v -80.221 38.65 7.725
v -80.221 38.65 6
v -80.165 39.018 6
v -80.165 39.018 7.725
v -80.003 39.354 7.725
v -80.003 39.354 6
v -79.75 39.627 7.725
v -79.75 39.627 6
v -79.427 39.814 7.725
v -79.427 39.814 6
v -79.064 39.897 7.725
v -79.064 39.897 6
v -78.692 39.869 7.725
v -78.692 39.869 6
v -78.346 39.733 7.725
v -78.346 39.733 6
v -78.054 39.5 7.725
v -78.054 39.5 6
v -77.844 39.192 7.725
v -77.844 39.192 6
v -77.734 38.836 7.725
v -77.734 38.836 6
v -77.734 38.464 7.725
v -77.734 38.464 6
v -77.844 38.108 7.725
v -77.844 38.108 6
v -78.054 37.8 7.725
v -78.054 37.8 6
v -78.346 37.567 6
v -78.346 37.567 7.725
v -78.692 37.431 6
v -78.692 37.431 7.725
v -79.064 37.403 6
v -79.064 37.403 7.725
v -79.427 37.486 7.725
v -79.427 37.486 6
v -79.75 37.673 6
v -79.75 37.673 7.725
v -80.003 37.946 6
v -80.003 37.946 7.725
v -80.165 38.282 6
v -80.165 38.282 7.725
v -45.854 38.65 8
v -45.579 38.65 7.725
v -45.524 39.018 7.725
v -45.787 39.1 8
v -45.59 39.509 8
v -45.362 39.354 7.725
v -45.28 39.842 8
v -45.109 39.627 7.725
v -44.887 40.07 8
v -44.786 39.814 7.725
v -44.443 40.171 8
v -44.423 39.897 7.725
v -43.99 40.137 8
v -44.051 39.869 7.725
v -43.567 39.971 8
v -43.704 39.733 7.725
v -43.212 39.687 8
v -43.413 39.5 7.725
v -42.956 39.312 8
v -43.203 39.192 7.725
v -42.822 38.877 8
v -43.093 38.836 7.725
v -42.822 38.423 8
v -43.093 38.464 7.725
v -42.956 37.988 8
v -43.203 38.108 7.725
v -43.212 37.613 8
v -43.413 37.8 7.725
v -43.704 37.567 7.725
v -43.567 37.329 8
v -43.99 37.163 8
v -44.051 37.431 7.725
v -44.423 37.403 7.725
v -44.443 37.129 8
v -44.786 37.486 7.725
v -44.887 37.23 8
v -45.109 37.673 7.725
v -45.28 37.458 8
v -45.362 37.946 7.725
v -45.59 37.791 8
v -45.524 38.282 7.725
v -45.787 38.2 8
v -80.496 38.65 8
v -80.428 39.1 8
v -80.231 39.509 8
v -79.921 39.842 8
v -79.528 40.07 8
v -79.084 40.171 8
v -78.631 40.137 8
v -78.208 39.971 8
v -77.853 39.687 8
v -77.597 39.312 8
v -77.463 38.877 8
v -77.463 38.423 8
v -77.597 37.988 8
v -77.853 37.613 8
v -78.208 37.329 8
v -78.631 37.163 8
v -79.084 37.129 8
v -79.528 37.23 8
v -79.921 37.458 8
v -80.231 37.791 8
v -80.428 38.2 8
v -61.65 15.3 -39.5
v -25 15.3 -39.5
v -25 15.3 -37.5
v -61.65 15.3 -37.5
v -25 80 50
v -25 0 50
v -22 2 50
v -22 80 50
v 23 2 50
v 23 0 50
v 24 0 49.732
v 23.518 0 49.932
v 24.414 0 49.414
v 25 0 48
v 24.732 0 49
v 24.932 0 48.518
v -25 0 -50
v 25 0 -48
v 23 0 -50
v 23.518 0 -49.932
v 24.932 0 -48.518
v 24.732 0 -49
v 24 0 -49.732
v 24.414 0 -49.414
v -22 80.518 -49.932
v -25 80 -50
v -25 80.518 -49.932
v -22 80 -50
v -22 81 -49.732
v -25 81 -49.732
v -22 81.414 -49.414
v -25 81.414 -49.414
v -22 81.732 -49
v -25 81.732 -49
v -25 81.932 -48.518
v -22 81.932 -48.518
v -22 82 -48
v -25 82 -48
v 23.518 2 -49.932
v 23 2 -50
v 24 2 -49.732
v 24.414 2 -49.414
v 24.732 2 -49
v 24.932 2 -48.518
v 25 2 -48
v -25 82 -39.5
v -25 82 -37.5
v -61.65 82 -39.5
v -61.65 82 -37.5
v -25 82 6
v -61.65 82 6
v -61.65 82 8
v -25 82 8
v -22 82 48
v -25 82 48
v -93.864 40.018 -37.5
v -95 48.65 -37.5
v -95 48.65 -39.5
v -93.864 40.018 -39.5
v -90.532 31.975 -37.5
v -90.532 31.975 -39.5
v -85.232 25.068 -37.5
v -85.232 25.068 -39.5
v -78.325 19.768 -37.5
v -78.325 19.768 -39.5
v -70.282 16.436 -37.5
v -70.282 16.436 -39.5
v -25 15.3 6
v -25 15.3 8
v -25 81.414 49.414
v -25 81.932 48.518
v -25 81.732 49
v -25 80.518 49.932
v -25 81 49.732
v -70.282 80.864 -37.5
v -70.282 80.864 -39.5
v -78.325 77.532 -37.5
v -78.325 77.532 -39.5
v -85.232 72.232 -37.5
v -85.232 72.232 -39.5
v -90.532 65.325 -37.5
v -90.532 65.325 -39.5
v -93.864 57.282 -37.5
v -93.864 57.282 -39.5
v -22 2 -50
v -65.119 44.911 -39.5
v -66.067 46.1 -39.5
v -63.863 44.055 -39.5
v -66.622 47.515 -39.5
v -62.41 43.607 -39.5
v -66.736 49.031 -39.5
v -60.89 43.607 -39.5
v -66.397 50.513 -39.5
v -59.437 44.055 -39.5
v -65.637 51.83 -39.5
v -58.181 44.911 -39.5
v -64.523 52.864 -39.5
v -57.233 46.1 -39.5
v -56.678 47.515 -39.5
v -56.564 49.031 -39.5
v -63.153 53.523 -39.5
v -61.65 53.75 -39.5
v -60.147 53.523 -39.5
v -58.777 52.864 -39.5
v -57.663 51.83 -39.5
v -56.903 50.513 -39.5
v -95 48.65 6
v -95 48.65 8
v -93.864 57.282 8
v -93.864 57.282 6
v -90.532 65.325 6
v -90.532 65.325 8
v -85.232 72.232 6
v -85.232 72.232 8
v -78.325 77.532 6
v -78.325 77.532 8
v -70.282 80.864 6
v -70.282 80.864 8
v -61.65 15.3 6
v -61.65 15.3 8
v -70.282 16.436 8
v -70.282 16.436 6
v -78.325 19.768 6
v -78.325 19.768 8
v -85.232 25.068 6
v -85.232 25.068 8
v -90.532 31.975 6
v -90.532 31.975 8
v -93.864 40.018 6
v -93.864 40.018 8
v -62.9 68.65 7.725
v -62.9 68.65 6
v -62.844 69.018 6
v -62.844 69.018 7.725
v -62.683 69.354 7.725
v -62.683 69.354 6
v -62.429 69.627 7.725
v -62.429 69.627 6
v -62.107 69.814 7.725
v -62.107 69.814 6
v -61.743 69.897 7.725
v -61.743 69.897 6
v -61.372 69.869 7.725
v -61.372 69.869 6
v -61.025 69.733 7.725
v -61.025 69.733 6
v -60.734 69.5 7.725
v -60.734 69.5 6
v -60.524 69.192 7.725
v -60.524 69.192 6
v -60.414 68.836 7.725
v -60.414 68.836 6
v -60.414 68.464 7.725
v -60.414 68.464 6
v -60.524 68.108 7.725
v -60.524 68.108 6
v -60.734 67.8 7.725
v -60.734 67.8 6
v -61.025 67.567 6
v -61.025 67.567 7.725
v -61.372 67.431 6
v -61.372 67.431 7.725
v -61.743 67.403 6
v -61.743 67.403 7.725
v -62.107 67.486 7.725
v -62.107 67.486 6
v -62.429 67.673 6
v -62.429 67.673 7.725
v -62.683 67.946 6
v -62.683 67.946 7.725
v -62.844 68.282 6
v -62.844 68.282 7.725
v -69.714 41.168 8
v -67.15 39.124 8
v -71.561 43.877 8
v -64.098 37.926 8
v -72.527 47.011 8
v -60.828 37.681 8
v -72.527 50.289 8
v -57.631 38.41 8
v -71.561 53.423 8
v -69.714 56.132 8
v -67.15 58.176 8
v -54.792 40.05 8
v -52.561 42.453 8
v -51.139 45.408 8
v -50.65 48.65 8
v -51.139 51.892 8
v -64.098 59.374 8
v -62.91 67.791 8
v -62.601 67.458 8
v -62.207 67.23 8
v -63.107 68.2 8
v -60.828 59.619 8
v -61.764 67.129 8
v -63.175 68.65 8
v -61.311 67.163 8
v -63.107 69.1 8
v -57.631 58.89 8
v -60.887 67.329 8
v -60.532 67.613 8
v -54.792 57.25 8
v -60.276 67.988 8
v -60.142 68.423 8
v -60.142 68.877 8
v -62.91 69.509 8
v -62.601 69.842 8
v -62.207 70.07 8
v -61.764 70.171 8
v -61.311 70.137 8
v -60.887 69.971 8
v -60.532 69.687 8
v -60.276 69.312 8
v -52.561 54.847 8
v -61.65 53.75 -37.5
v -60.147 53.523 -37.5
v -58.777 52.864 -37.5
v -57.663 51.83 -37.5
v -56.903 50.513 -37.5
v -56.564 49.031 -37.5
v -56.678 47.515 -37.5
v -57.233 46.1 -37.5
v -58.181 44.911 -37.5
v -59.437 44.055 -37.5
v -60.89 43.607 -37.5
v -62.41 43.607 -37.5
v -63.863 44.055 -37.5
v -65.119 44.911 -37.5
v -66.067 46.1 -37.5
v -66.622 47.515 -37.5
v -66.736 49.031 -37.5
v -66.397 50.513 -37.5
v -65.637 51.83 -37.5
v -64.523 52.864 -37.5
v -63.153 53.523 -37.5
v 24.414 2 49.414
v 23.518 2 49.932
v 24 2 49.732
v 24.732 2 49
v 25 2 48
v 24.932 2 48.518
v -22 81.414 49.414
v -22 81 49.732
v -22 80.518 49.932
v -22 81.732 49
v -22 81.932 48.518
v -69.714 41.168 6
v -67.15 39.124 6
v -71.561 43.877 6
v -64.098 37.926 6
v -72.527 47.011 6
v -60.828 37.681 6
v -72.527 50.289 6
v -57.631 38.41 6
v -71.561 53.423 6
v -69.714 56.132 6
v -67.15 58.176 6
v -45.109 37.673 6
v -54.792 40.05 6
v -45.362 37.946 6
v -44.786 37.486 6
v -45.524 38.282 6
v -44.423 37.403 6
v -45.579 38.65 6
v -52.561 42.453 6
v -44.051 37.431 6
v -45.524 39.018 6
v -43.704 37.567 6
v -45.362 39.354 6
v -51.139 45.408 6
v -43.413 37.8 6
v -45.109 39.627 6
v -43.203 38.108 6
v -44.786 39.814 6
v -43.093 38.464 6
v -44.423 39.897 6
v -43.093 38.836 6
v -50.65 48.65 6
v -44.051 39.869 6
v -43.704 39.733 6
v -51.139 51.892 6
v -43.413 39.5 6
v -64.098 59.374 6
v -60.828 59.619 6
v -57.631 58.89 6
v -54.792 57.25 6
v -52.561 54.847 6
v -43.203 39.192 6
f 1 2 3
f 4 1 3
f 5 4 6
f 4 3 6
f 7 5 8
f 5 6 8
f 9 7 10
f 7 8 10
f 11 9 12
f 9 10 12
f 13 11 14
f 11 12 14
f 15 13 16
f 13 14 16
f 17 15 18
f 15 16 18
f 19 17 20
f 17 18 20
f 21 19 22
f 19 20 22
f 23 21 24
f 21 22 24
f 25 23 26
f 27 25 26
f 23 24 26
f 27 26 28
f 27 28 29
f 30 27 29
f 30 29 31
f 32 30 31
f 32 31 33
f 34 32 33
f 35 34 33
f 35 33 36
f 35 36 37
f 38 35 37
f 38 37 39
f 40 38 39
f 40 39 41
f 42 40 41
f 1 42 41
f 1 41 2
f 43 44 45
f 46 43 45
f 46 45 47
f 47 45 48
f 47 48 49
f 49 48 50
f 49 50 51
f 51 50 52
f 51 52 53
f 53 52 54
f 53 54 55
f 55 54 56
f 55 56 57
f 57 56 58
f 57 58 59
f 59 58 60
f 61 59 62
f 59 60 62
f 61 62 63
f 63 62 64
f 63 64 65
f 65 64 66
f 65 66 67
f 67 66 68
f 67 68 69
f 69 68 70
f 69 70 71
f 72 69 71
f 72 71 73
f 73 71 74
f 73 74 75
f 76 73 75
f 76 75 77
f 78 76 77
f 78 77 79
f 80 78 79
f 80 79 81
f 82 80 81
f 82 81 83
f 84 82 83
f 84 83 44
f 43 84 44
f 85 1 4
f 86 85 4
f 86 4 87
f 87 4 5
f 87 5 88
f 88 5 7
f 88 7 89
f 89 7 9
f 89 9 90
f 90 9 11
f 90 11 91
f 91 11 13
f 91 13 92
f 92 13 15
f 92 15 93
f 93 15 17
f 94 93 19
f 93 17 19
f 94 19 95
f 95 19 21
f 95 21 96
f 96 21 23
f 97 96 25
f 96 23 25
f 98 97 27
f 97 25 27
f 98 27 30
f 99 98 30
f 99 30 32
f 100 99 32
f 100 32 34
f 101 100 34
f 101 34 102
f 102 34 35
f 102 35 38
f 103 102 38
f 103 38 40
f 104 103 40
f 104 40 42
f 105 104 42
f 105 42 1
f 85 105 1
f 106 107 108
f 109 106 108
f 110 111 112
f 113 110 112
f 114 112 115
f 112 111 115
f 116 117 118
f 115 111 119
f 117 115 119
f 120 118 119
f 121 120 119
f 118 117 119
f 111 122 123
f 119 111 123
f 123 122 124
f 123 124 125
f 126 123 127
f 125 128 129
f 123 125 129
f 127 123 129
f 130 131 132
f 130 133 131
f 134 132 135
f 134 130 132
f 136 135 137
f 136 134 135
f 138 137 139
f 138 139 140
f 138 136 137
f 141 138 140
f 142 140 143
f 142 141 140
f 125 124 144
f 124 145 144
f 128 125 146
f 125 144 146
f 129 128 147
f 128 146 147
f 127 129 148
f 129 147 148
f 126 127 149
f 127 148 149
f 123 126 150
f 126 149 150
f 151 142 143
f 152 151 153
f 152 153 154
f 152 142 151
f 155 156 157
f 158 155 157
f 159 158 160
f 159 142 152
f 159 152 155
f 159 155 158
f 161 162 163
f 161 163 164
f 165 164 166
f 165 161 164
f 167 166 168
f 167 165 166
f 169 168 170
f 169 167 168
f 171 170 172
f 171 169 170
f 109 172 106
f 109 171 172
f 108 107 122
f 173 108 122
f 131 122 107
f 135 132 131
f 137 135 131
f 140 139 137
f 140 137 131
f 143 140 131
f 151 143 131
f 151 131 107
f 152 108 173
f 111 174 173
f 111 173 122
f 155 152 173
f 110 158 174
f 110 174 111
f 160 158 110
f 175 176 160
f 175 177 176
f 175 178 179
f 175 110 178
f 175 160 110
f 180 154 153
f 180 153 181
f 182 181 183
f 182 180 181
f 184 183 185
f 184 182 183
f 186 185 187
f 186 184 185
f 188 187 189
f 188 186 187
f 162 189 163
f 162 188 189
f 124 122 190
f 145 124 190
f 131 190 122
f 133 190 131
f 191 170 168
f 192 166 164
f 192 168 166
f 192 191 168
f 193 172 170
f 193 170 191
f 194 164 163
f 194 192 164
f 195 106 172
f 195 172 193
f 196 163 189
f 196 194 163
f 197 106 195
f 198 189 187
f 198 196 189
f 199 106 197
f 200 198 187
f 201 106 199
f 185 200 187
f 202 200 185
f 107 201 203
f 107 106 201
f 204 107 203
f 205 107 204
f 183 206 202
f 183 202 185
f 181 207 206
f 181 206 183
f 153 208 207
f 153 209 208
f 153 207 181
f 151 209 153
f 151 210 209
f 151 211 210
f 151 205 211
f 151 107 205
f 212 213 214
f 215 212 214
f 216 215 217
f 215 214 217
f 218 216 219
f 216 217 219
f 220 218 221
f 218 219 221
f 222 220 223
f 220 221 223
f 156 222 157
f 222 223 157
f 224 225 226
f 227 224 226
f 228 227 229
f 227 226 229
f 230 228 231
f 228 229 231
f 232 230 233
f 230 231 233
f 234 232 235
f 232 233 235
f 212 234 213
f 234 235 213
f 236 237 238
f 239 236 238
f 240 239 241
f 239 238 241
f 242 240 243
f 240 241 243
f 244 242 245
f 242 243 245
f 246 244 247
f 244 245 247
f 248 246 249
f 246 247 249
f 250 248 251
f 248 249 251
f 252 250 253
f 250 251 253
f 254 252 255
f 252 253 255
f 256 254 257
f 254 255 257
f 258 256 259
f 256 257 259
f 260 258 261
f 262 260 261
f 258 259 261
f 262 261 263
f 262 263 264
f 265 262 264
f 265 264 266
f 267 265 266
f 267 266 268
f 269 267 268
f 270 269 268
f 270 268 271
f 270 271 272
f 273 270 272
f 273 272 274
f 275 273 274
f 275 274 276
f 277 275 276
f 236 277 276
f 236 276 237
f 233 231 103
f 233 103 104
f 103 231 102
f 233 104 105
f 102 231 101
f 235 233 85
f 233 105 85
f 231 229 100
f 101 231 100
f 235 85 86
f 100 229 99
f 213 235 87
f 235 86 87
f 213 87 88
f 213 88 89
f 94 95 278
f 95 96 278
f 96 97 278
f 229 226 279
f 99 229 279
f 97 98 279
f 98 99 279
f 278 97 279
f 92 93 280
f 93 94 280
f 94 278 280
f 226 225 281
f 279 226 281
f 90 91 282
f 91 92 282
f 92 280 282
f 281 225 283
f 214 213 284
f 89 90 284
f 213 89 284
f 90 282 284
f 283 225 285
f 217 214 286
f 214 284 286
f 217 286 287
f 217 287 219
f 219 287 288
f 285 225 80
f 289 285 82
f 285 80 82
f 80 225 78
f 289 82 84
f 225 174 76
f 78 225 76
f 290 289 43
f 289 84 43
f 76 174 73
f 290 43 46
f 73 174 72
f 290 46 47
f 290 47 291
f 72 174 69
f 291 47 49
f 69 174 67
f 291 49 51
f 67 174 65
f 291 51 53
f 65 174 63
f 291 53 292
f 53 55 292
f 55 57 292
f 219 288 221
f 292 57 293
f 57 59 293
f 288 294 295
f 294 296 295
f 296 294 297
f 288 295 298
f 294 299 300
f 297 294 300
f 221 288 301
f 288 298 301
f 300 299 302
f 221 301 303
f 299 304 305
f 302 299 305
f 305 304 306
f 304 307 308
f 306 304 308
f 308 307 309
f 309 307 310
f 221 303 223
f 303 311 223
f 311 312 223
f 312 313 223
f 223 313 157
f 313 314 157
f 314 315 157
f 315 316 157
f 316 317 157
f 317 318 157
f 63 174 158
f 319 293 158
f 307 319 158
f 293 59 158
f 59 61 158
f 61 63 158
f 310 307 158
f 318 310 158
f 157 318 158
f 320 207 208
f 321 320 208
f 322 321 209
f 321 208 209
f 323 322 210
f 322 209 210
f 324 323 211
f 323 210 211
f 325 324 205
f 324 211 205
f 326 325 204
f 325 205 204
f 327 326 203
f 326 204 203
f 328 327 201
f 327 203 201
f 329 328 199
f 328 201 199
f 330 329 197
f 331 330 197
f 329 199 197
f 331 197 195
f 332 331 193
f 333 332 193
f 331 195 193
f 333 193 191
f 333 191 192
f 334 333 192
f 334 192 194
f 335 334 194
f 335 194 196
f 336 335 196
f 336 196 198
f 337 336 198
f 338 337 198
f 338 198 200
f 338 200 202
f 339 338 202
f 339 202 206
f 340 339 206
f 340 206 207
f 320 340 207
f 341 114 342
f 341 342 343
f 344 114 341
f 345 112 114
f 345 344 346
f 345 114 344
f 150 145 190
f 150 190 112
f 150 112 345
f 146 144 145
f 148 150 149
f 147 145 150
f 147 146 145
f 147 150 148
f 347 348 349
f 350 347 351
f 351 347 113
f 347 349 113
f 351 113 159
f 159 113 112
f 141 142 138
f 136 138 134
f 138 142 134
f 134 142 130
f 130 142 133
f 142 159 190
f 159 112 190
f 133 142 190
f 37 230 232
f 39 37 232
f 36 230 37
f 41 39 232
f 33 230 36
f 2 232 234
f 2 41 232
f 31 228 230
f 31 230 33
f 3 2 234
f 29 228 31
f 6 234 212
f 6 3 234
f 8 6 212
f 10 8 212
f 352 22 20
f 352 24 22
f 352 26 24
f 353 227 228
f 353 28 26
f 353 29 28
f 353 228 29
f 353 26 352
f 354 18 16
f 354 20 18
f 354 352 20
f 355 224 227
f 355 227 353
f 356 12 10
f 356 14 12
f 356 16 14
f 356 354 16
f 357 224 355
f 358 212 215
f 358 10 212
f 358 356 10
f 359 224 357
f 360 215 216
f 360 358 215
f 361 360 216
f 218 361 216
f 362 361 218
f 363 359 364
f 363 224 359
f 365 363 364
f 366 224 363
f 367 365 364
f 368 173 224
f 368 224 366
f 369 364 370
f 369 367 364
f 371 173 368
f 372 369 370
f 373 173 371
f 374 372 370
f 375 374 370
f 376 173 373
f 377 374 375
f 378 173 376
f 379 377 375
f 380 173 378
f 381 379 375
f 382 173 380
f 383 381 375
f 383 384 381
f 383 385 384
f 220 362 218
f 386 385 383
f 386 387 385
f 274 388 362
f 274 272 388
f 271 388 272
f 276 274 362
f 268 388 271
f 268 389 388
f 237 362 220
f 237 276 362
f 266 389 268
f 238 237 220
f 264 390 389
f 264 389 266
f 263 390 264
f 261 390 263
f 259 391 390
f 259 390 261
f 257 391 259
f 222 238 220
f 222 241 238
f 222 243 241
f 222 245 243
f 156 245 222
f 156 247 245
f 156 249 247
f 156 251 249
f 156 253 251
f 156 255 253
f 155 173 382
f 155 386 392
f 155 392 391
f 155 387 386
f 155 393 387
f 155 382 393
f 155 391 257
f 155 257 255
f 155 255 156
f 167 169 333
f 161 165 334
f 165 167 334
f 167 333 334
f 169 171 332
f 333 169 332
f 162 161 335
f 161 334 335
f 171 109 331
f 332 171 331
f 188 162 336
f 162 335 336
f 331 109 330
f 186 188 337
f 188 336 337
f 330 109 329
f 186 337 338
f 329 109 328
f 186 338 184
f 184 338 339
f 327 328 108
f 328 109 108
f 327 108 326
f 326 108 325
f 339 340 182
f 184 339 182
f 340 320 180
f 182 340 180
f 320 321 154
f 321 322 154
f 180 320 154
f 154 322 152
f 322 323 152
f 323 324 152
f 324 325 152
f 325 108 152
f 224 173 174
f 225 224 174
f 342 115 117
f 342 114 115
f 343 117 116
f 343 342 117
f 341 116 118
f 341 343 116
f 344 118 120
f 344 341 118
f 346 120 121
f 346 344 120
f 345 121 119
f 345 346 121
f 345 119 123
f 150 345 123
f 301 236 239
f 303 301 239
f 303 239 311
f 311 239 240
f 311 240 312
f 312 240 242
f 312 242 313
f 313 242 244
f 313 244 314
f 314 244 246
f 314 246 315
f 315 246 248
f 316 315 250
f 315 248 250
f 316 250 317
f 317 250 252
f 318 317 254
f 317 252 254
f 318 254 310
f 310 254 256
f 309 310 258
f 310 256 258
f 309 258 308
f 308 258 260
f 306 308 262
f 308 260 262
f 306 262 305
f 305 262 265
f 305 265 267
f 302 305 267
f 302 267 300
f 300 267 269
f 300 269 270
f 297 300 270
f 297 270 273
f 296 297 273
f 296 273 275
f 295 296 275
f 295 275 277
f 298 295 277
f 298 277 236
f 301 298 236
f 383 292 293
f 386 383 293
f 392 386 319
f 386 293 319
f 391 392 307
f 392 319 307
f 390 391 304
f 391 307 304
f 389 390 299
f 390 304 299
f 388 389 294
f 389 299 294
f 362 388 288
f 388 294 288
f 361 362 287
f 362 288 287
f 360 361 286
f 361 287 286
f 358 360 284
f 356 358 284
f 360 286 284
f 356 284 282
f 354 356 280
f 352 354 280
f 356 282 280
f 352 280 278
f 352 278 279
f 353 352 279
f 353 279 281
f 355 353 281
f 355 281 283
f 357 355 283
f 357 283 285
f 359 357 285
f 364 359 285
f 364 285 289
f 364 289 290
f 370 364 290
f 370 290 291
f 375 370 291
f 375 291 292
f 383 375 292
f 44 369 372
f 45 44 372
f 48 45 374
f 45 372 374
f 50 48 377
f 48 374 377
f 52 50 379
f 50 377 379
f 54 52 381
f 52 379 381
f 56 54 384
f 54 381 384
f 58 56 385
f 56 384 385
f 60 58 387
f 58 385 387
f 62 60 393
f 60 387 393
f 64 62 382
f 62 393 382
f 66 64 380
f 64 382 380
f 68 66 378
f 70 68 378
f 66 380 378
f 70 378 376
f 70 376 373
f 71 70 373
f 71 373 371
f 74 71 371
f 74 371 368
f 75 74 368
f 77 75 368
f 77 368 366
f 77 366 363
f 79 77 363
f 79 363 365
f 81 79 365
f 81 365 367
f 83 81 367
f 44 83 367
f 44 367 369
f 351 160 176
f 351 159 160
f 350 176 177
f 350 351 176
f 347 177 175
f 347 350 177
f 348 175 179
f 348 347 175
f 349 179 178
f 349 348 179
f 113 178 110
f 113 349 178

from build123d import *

# Parameters (mm, degrees)
SKETCH_1_W                   = 50
SKETCH_1_H                   = 100
EXTRUDE_1_DEPTH              = 2
SKETCH_2_W                   = 3
SKETCH_2_H                   = 100
EXTRUDE_2_DEPTH              = 80
SKETCH_3_W                   = 2
SKETCH_3_H                   = 66.7
EXTRUDE_3_DEPTH              = 70
CUT_EXTRUDE_4_REACH          = 162.465
SKETCH_8_W                   = 2
SKETCH_8_H                   = 66.7
EXTRUDE_4_DEPTH              = 70
CUT_EXTRUDE_5_REACH          = 140.25
HOLE_WIZARD_M3_1_D           = 2.5
HOLE_WIZARD_M3_1_DEPTH       = 2
HOLE_WIZARD_M3_1_CSINK_D     = 3.05
HOLE_WIZARD_M3_1_CSINK_ANGLE = 90
FILLET_1_R                   = 2
CUT_EXTRUDE_6_REACH          = 140.25
SKETCH_12_R                  = 11
CUT_EXTRUDE_7_REACH          = 162.465
SKETCH_13_R                  = 14.5
SKETCH_14_W                  = 2
SKETCH_14_H                  = 66.7
EXTRUDE_5_DEPTH              = 70
CUT_EXTRUDE_8_REACH          = 156.14
SKETCH_15_R                  = 5.1
CUT_EXTRUDE_9_DEPTH          = 155.140358116
CUT_EXTRUDE_9_DEPTH_BACK     = 155.140358116
SKETCH_19_W                  = 2
SKETCH_19_H                  = 66.7
CUT_EXTRUDE_10_DEPTH         = 119.844436134
FILLET_2_R                   = 2


with BuildPart() as part:
    # 草图1 → 凸台-拉伸1 (new body)
    with BuildSketch(Plane(origin=(0, 0, 0), x_dir=(1, 0, 0), z_dir=(0, 1, 0))):
        Rectangle(SKETCH_1_W, SKETCH_1_H)
    extrude(amount=EXTRUDE_1_DEPTH)

    # 草图2 → 凸台-拉伸2 (add)
    with BuildSketch(Plane(origin=(0, 2, 0), x_dir=(1, 0, 0), z_dir=(0, 1, 0))):
        with Locations((-23.5, 0)):
            Rectangle(SKETCH_2_W, SKETCH_2_H)
    extrude(amount=EXTRUDE_2_DEPTH)

    # 草图3 → 凸台-拉伸3 (add)
    with BuildSketch(Plane.ZY.offset(25)):
        with Locations((-49, 48.65)):
            Rectangle(SKETCH_3_W, SKETCH_3_H)
    extrude(amount=EXTRUDE_3_DEPTH)

    # 草图4 → 切除-拉伸4 (cut, up to next)
    with BuildSketch(Plane(origin=(0, 0, -50), x_dir=(-1, 0, 0), z_dir=(0, 0, -1)), mode=Mode.PRIVATE) as cut_extrude_4_sk1:
        with BuildLine():
            Line((95, 82), (61.65, 82))
            ThreePointArc((61.65, 82), (85.232011153, 72.232011153), (95, 48.65))
            Line((95, 48.65), (95, 82))
        make_face()
    cut_extrude_4_tool1 = extrude(cut_extrude_4_sk1.sketch, amount=-CUT_EXTRUDE_4_REACH, mode=Mode.PRIVATE) & part.part
    # 草图4 → 切除-拉伸4 (cut, up to next)
    with BuildSketch(Plane(origin=(0, 0, -50), x_dir=(-1, 0, 0), z_dir=(0, 0, -1)), mode=Mode.PRIVATE) as cut_extrude_4_sk2:
        with BuildLine():
            ThreePointArc((95, 48.65), (85.232011153, 25.067988847), (61.65, 15.3))
            Line((61.65, 15.3), (95, 15.3))
            Line((95, 15.3), (95, 48.65))
        make_face()
    cut_extrude_4_tool2 = extrude(cut_extrude_4_sk2.sketch, amount=-CUT_EXTRUDE_4_REACH, mode=Mode.PRIVATE) & part.part
    add(cut_extrude_4_tool1.solids().sort_by_distance((-87.550679, 74.550679, -50))[0], mode=Mode.SUBTRACT)
    add(cut_extrude_4_tool2.solids().sort_by_distance((-87.550679, 22.749321, -50))[0], mode=Mode.SUBTRACT)

    # 草图8 → 凸台-拉伸4 (add)
    with BuildSketch(Plane.ZY.offset(25)):
        with Locations((7, 48.65)):
            Rectangle(SKETCH_8_W, SKETCH_8_H)
    extrude(amount=EXTRUDE_4_DEPTH)

    # 草图9 → 切除-拉伸5 (cut, up to next)
    with BuildSketch(Plane.XY.offset(8), mode=Mode.PRIVATE) as cut_extrude_5_sk1:
        with BuildLine():
            ThreePointArc((-95, 48.65), (-85.232011153, 72.232011153), (-61.65, 82))
            Line((-61.65, 82), (-95, 82))
            Line((-95, 82), (-95, 48.65))
        make_face()
    cut_extrude_5_tool1 = extrude(cut_extrude_5_sk1.sketch, amount=-CUT_EXTRUDE_5_REACH, mode=Mode.PRIVATE) & part.part
    # 草图9 → 切除-拉伸5 (cut, up to next)
    with BuildSketch(Plane.XY.offset(8), mode=Mode.PRIVATE) as cut_extrude_5_sk2:
        with BuildLine():
            ThreePointArc((-61.65, 15.3), (-85.232011153, 25.067988847), (-95, 48.65))
            Line((-95, 48.65), (-95, 15.3))
            Line((-95, 15.3), (-61.65, 15.3))
        make_face()
    cut_extrude_5_tool2 = extrude(cut_extrude_5_sk2.sketch, amount=-CUT_EXTRUDE_5_REACH, mode=Mode.PRIVATE) & part.part
    add(cut_extrude_5_tool1.solids().sort_by_distance((-87.550679, 74.550679, 8))[0], mode=Mode.SUBTRACT)
    add(cut_extrude_5_tool2.solids().sort_by_distance((-87.550679, 22.749321, 8))[0], mode=Mode.SUBTRACT)

    # M3 螺纹孔1
    with Locations(Plane.XY.offset(8)):
        with Locations((-78.970508076, 38.65), (-61.65, 68.65), (-44.329491924, 38.65)):
            CounterSinkHole(HOLE_WIZARD_M3_1_D / 2, HOLE_WIZARD_M3_1_CSINK_D / 2, depth=HOLE_WIZARD_M3_1_DEPTH, counter_sink_angle=HOLE_WIZARD_M3_1_CSINK_ANGLE)

    # 圆角1
    fillet_1_edges = [part.edges().sort_by_distance(p)[0] for p in [
        (-23.5, 82, 50),
        (25, 1, 50),
        (25, 1, -50),
    ]]
    fillet(fillet_1_edges, radius=FILLET_1_R)

    # 草图12 → 切除-拉伸6 (cut, up to next)
    with BuildSketch(Plane.XY.offset(8), mode=Mode.PRIVATE) as cut_extrude_6_sk1:
        with Locations((-61.65, 48.65)):
            Circle(SKETCH_12_R)
    cut_extrude_6_tool1 = extrude(cut_extrude_6_sk1.sketch, amount=-CUT_EXTRUDE_6_REACH, mode=Mode.PRIVATE) & part.part
    add(cut_extrude_6_tool1.solids().sort_by_distance((-61.65, 48.65, 8))[0], mode=Mode.SUBTRACT)

    # 草图13 → 切除-拉伸7 (cut, up to next)
    with BuildSketch(Plane(origin=(0, 0, -50), x_dir=(-1, 0, 0), z_dir=(0, 0, -1)), mode=Mode.PRIVATE) as cut_extrude_7_sk1:
        with Locations((61.65, 48.65)):
            Circle(SKETCH_13_R)
    cut_extrude_7_tool1 = extrude(cut_extrude_7_sk1.sketch, amount=-CUT_EXTRUDE_7_REACH, mode=Mode.PRIVATE) & part.part
    add(cut_extrude_7_tool1.solids().sort_by_distance((-61.65, 48.65, -50))[0], mode=Mode.SUBTRACT)

    # 草图14 → 凸台-拉伸5 (add)
    with BuildSketch(Plane.ZY.offset(25)):
        with Locations((-38.5, 48.65)):
            Rectangle(SKETCH_14_W, SKETCH_14_H)
    extrude(amount=EXTRUDE_5_DEPTH)

    # 草图15 → 切除-拉伸8 (cut, up to next)
    with BuildSketch(Plane(origin=(0, 0, -39.5), x_dir=(-1, 0, 0), z_dir=(0, 0, -1)), mode=Mode.PRIVATE) as cut_extrude_8_sk1:
        with Locations(Location((61.65, 48.65, 0), (0, 0, 90))):
            Circle(SKETCH_15_R)
    cut_extrude_8_tool1 = extrude(cut_extrude_8_sk1.sketch, amount=-CUT_EXTRUDE_8_REACH, mode=Mode.PRIVATE) & part.part
    add(cut_extrude_8_tool1.solids().sort_by_distance((-61.65, 48.65, -39.5))[0], mode=Mode.SUBTRACT)

    # 草图18 → 切除-拉伸9 (cut, two sides: drawn at the far end of the back side and taken through both)
    with BuildSketch(Plane(origin=(0, 0, -39.5), x_dir=(-1, 0, 0), z_dir=(0, 0, -1)).offset(-CUT_EXTRUDE_9_DEPTH_BACK)):
        with BuildLine():
            Line((95, 15.3), (95, 48.65))
            ThreePointArc((95, 48.65), (85.232011153, 25.067988847), (61.65, 15.3))
            Line((61.65, 15.3), (95, 15.3))
        make_face()
        with BuildLine():
            Line((95, 48.65), (95, 82))
            Line((95, 82), (61.65, 82))
            ThreePointArc((61.65, 82), (85.232011153, 72.232011153), (95, 48.65))
        make_face()
    extrude(amount=CUT_EXTRUDE_9_DEPTH + CUT_EXTRUDE_9_DEPTH_BACK, mode=Mode.SUBTRACT)

    # 草图19 → 切除-拉伸10 (cut, through all)
    with BuildSketch(Plane.ZY.offset(25)):
        with Locations((-49, 48.65)):
            Rectangle(SKETCH_19_W, SKETCH_19_H)
    extrude(amount=CUT_EXTRUDE_10_DEPTH, mode=Mode.SUBTRACT)

    # 圆角2
    fillet_2_edges = [part.edges().sort_by_distance(p)[0] for p in [
        (-23.5, 82, -50),
    ]]
    fillet(fillet_2_edges, radius=FILLET_2_R)


solid = part.part
